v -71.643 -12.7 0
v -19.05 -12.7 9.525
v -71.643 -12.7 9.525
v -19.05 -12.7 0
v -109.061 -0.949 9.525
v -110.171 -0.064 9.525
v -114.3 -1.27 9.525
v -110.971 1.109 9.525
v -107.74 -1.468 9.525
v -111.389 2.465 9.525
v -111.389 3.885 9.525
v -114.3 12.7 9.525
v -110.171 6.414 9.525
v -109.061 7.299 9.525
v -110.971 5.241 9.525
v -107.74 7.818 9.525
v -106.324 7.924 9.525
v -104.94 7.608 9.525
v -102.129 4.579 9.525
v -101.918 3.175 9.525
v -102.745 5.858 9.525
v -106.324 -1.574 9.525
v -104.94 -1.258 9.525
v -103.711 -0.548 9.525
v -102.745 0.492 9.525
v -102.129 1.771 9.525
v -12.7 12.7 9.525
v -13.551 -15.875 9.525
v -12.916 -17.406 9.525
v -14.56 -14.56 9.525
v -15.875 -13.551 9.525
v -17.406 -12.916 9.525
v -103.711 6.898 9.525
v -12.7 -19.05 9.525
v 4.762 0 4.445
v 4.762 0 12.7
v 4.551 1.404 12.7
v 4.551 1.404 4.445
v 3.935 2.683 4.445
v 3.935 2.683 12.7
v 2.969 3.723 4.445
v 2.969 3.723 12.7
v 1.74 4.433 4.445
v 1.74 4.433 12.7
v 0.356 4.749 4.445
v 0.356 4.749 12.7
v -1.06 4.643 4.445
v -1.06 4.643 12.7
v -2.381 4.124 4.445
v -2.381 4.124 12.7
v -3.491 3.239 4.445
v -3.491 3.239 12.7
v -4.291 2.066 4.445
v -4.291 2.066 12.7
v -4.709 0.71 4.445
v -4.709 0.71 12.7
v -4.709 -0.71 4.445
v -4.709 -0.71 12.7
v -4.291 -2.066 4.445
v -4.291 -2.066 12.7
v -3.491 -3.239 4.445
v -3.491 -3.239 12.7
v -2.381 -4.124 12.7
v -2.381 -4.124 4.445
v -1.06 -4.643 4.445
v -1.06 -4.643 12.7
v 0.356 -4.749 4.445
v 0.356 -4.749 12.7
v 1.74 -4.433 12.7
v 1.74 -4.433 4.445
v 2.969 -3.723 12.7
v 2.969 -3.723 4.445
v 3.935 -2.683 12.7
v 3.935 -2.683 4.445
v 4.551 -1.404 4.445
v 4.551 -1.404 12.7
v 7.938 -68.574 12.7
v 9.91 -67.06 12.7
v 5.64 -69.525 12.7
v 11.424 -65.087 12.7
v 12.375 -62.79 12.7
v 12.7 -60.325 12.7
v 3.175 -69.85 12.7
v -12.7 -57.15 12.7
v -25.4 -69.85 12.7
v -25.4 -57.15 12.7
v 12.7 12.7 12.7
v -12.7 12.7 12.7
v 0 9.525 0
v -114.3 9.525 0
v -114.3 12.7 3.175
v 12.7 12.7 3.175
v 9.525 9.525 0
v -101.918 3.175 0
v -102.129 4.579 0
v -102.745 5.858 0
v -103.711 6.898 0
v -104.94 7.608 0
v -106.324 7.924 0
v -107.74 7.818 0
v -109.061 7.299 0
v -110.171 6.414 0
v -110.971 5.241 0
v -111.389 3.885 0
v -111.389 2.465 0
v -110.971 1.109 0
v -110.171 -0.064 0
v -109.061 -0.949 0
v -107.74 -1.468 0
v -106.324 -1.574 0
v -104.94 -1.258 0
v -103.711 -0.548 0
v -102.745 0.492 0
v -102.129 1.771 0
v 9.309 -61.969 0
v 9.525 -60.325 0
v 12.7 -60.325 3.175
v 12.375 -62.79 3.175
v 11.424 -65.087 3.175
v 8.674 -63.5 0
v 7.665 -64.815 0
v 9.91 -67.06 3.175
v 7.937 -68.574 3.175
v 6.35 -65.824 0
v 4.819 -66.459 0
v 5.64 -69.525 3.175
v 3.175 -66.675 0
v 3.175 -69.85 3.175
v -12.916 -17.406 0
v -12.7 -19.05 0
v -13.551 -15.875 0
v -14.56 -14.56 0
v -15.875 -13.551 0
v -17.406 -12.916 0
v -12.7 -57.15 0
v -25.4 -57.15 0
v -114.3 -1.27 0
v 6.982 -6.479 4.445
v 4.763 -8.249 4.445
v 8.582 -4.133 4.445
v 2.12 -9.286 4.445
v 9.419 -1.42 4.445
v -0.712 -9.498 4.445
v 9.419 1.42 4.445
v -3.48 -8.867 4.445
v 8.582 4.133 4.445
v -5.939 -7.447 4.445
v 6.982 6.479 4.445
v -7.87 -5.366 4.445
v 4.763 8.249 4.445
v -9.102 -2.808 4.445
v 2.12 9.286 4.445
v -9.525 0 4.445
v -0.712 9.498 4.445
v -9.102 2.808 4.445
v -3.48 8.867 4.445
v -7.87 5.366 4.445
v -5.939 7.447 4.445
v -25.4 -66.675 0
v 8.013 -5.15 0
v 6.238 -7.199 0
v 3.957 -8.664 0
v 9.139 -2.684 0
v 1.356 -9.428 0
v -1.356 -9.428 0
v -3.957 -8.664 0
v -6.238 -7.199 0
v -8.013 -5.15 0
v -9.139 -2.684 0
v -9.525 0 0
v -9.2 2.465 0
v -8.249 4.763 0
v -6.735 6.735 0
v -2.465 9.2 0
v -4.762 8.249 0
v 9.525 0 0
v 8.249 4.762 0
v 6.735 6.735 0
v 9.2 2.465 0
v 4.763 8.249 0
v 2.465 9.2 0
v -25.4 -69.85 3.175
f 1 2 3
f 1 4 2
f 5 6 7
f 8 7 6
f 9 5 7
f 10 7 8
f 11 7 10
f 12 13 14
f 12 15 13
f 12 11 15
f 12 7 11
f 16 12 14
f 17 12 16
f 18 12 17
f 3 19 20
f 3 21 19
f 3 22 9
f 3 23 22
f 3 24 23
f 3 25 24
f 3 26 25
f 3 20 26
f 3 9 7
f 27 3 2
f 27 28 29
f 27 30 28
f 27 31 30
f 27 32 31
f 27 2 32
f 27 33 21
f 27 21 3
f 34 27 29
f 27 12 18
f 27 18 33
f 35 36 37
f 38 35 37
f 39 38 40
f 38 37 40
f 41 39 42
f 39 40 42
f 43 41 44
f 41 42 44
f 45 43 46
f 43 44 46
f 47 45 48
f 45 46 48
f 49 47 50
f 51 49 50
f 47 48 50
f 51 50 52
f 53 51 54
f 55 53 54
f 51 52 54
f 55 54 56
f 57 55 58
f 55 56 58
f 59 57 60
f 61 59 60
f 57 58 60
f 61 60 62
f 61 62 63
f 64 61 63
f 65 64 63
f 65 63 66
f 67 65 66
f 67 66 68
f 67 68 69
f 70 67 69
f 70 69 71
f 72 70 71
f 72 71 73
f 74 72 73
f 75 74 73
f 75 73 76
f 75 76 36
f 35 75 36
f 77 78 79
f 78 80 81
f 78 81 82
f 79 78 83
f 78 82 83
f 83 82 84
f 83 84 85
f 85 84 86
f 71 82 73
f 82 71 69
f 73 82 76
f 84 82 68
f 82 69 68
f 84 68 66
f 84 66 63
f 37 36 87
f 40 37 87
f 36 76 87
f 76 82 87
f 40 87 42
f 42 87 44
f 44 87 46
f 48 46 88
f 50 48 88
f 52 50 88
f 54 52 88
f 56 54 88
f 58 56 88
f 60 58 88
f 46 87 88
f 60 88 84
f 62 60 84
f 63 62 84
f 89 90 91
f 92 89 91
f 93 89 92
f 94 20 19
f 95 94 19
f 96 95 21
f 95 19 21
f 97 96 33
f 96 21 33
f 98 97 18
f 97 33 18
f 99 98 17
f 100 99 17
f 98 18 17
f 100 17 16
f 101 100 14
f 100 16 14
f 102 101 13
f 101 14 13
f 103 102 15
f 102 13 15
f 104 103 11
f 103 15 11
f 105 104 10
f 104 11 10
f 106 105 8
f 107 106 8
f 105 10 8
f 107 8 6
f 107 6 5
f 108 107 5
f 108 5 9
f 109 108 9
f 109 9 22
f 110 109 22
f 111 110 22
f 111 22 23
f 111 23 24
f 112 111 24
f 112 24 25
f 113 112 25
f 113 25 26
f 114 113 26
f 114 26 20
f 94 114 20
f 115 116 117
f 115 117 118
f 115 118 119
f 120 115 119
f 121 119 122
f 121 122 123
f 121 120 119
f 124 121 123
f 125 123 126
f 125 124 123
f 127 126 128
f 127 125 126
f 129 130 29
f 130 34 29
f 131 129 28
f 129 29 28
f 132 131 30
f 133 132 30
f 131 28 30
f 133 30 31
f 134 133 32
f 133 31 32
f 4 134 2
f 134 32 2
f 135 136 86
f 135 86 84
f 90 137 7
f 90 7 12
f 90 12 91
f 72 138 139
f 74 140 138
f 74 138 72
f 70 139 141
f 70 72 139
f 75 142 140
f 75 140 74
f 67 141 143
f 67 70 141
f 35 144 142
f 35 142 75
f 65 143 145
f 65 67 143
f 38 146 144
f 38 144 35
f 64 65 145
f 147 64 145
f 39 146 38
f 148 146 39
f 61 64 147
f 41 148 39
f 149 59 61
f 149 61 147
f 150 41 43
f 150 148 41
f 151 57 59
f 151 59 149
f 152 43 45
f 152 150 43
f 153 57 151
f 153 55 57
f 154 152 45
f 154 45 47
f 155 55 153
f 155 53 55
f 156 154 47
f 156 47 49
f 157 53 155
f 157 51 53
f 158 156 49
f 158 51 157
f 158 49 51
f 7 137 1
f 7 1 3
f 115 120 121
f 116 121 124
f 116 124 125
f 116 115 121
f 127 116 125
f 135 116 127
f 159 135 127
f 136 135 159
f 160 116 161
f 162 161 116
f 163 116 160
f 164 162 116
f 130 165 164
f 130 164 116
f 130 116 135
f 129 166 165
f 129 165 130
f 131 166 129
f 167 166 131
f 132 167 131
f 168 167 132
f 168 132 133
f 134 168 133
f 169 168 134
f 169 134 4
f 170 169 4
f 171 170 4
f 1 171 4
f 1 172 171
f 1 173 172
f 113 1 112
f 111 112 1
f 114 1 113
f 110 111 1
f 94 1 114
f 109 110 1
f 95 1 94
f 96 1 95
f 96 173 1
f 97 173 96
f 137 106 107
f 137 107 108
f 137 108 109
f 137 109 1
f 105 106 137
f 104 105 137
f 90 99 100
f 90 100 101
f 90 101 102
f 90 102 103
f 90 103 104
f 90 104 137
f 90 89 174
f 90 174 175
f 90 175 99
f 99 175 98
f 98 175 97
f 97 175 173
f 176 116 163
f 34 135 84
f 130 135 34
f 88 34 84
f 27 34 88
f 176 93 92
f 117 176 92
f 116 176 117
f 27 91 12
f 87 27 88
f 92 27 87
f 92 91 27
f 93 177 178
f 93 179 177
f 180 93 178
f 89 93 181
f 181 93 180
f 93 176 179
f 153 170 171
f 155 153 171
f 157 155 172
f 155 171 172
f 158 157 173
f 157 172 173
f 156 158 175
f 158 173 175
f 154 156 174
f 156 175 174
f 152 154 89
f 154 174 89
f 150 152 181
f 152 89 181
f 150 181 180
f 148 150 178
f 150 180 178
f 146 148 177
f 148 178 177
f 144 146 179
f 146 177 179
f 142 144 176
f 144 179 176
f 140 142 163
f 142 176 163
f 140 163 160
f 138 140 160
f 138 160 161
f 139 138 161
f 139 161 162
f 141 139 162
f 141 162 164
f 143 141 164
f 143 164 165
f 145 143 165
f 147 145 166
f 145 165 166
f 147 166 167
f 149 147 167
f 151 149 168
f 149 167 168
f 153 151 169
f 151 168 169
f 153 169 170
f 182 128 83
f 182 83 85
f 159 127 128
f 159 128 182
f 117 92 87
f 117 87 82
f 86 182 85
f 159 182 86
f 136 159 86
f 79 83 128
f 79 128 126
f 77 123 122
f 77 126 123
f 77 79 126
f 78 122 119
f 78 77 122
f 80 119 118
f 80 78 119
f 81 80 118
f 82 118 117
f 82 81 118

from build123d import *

# Parameters (mm, degrees)
BASE_EXTRUDE_DEPTH = 12.7
SKETCH2_R          = 4.7625
CUT_EXTRUDE1_DEPTH = 135.554087638
SKETCH3_R          = 4.7625
CUT_EXTRUDE2_DEPTH = 135.554087638
CHAMFER1_SIZE      = 11.43
CHAMFER1_SIZE2     = 42.657340731
SKETCH4_W          = 101.6
SKETCH4_H          = 25.4
CUT_EXTRUDE3_DEPTH = 3.175
FILLET1_R          = 9.525
FILLET2_R          = 6.35
CHAMFER2_SIZE      = 3.175
SKETCH5_R          = 9.525
CUT_EXTRUDE4_DEPTH = 4.445


with BuildPart() as part:
    # Sketch1 → Base-Extrude (new body)
    with BuildSketch(Plane.XY):
        Polygon((-114.3, 12.7), (12.7, 12.7), (12.7, -69.85), (-25.4, -69.85), (-25.4, -57.15), (-12.7, -57.15), (-12.7, -12.7), (-114.3, -12.7), align=None)
    extrude(amount=BASE_EXTRUDE_DEPTH)

    # Sketch2 → Cut-Extrude1 (cut, through all)
    with BuildSketch(Plane.XY.offset(12.7)):
        Circle(SKETCH2_R)
    extrude(amount=-CUT_EXTRUDE1_DEPTH, mode=Mode.SUBTRACT)

    # Sketch3 → Cut-Extrude2 (cut, through all)
    with BuildSketch(Plane.XY.offset(12.7)):
        with Locations((-106.68, 3.175)):
            Circle(SKETCH3_R)
    extrude(amount=-CUT_EXTRUDE2_DEPTH, mode=Mode.SUBTRACT)

    # Chamfer1
    chamfer1_edges = [part.edges().sort_by_distance(p)[0] for p in [
        (-114.3, -12.7, 6.35),
    ]]
    chamfer1_side = [part.faces().sort_by_distance(p)[0] for p in [
        (-114.3, 0, 6.35),
    ]]
    chamfer(chamfer1_edges, length=CHAMFER1_SIZE, length2=CHAMFER1_SIZE2, reference=chamfer1_side[0])

    # Sketch4 → Cut-Extrude3 (cut)
    with BuildSketch(Plane.XY.offset(12.7)):
        with Locations((-63.5, 0)):
            Rectangle(SKETCH4_W, SKETCH4_H)
    extrude(amount=-CUT_EXTRUDE3_DEPTH, mode=Mode.SUBTRACT)

    # Fillet1
    fillet1_edges = [part.edges().sort_by_distance(p)[0] for p in [
        (12.7, -69.85, 6.35),
    ]]
    fillet(fillet1_edges, radius=FILLET1_R)

    # Fillet2
    fillet2_edges = [part.edges().sort_by_distance(p)[0] for p in [
        (-12.7, -12.7, 4.7625),
    ]]
    fillet(fillet2_edges, radius=FILLET2_R)

    # Chamfer2
    chamfer2_edges = [part.edges().sort_by_distance(p)[0] for p in [
        (12.7, -23.8125, 0),
        (9.910192091, -67.060192091, 0),
        (-50.8, 12.7, 0),
        (-11.1125, -69.85, 0),
    ]]
    chamfer(chamfer2_edges, length=CHAMFER2_SIZE)

    # Sketch5 → Cut-Extrude4 (cut)
    with BuildSketch(Plane(origin=(0, 0, 0), x_dir=(-1, 0, 0), z_dir=(0, 0, -1))):
        Circle(SKETCH5_R)
    extrude(amount=-CUT_EXTRUDE4_DEPTH, mode=Mode.SUBTRACT)


solid = part.part
